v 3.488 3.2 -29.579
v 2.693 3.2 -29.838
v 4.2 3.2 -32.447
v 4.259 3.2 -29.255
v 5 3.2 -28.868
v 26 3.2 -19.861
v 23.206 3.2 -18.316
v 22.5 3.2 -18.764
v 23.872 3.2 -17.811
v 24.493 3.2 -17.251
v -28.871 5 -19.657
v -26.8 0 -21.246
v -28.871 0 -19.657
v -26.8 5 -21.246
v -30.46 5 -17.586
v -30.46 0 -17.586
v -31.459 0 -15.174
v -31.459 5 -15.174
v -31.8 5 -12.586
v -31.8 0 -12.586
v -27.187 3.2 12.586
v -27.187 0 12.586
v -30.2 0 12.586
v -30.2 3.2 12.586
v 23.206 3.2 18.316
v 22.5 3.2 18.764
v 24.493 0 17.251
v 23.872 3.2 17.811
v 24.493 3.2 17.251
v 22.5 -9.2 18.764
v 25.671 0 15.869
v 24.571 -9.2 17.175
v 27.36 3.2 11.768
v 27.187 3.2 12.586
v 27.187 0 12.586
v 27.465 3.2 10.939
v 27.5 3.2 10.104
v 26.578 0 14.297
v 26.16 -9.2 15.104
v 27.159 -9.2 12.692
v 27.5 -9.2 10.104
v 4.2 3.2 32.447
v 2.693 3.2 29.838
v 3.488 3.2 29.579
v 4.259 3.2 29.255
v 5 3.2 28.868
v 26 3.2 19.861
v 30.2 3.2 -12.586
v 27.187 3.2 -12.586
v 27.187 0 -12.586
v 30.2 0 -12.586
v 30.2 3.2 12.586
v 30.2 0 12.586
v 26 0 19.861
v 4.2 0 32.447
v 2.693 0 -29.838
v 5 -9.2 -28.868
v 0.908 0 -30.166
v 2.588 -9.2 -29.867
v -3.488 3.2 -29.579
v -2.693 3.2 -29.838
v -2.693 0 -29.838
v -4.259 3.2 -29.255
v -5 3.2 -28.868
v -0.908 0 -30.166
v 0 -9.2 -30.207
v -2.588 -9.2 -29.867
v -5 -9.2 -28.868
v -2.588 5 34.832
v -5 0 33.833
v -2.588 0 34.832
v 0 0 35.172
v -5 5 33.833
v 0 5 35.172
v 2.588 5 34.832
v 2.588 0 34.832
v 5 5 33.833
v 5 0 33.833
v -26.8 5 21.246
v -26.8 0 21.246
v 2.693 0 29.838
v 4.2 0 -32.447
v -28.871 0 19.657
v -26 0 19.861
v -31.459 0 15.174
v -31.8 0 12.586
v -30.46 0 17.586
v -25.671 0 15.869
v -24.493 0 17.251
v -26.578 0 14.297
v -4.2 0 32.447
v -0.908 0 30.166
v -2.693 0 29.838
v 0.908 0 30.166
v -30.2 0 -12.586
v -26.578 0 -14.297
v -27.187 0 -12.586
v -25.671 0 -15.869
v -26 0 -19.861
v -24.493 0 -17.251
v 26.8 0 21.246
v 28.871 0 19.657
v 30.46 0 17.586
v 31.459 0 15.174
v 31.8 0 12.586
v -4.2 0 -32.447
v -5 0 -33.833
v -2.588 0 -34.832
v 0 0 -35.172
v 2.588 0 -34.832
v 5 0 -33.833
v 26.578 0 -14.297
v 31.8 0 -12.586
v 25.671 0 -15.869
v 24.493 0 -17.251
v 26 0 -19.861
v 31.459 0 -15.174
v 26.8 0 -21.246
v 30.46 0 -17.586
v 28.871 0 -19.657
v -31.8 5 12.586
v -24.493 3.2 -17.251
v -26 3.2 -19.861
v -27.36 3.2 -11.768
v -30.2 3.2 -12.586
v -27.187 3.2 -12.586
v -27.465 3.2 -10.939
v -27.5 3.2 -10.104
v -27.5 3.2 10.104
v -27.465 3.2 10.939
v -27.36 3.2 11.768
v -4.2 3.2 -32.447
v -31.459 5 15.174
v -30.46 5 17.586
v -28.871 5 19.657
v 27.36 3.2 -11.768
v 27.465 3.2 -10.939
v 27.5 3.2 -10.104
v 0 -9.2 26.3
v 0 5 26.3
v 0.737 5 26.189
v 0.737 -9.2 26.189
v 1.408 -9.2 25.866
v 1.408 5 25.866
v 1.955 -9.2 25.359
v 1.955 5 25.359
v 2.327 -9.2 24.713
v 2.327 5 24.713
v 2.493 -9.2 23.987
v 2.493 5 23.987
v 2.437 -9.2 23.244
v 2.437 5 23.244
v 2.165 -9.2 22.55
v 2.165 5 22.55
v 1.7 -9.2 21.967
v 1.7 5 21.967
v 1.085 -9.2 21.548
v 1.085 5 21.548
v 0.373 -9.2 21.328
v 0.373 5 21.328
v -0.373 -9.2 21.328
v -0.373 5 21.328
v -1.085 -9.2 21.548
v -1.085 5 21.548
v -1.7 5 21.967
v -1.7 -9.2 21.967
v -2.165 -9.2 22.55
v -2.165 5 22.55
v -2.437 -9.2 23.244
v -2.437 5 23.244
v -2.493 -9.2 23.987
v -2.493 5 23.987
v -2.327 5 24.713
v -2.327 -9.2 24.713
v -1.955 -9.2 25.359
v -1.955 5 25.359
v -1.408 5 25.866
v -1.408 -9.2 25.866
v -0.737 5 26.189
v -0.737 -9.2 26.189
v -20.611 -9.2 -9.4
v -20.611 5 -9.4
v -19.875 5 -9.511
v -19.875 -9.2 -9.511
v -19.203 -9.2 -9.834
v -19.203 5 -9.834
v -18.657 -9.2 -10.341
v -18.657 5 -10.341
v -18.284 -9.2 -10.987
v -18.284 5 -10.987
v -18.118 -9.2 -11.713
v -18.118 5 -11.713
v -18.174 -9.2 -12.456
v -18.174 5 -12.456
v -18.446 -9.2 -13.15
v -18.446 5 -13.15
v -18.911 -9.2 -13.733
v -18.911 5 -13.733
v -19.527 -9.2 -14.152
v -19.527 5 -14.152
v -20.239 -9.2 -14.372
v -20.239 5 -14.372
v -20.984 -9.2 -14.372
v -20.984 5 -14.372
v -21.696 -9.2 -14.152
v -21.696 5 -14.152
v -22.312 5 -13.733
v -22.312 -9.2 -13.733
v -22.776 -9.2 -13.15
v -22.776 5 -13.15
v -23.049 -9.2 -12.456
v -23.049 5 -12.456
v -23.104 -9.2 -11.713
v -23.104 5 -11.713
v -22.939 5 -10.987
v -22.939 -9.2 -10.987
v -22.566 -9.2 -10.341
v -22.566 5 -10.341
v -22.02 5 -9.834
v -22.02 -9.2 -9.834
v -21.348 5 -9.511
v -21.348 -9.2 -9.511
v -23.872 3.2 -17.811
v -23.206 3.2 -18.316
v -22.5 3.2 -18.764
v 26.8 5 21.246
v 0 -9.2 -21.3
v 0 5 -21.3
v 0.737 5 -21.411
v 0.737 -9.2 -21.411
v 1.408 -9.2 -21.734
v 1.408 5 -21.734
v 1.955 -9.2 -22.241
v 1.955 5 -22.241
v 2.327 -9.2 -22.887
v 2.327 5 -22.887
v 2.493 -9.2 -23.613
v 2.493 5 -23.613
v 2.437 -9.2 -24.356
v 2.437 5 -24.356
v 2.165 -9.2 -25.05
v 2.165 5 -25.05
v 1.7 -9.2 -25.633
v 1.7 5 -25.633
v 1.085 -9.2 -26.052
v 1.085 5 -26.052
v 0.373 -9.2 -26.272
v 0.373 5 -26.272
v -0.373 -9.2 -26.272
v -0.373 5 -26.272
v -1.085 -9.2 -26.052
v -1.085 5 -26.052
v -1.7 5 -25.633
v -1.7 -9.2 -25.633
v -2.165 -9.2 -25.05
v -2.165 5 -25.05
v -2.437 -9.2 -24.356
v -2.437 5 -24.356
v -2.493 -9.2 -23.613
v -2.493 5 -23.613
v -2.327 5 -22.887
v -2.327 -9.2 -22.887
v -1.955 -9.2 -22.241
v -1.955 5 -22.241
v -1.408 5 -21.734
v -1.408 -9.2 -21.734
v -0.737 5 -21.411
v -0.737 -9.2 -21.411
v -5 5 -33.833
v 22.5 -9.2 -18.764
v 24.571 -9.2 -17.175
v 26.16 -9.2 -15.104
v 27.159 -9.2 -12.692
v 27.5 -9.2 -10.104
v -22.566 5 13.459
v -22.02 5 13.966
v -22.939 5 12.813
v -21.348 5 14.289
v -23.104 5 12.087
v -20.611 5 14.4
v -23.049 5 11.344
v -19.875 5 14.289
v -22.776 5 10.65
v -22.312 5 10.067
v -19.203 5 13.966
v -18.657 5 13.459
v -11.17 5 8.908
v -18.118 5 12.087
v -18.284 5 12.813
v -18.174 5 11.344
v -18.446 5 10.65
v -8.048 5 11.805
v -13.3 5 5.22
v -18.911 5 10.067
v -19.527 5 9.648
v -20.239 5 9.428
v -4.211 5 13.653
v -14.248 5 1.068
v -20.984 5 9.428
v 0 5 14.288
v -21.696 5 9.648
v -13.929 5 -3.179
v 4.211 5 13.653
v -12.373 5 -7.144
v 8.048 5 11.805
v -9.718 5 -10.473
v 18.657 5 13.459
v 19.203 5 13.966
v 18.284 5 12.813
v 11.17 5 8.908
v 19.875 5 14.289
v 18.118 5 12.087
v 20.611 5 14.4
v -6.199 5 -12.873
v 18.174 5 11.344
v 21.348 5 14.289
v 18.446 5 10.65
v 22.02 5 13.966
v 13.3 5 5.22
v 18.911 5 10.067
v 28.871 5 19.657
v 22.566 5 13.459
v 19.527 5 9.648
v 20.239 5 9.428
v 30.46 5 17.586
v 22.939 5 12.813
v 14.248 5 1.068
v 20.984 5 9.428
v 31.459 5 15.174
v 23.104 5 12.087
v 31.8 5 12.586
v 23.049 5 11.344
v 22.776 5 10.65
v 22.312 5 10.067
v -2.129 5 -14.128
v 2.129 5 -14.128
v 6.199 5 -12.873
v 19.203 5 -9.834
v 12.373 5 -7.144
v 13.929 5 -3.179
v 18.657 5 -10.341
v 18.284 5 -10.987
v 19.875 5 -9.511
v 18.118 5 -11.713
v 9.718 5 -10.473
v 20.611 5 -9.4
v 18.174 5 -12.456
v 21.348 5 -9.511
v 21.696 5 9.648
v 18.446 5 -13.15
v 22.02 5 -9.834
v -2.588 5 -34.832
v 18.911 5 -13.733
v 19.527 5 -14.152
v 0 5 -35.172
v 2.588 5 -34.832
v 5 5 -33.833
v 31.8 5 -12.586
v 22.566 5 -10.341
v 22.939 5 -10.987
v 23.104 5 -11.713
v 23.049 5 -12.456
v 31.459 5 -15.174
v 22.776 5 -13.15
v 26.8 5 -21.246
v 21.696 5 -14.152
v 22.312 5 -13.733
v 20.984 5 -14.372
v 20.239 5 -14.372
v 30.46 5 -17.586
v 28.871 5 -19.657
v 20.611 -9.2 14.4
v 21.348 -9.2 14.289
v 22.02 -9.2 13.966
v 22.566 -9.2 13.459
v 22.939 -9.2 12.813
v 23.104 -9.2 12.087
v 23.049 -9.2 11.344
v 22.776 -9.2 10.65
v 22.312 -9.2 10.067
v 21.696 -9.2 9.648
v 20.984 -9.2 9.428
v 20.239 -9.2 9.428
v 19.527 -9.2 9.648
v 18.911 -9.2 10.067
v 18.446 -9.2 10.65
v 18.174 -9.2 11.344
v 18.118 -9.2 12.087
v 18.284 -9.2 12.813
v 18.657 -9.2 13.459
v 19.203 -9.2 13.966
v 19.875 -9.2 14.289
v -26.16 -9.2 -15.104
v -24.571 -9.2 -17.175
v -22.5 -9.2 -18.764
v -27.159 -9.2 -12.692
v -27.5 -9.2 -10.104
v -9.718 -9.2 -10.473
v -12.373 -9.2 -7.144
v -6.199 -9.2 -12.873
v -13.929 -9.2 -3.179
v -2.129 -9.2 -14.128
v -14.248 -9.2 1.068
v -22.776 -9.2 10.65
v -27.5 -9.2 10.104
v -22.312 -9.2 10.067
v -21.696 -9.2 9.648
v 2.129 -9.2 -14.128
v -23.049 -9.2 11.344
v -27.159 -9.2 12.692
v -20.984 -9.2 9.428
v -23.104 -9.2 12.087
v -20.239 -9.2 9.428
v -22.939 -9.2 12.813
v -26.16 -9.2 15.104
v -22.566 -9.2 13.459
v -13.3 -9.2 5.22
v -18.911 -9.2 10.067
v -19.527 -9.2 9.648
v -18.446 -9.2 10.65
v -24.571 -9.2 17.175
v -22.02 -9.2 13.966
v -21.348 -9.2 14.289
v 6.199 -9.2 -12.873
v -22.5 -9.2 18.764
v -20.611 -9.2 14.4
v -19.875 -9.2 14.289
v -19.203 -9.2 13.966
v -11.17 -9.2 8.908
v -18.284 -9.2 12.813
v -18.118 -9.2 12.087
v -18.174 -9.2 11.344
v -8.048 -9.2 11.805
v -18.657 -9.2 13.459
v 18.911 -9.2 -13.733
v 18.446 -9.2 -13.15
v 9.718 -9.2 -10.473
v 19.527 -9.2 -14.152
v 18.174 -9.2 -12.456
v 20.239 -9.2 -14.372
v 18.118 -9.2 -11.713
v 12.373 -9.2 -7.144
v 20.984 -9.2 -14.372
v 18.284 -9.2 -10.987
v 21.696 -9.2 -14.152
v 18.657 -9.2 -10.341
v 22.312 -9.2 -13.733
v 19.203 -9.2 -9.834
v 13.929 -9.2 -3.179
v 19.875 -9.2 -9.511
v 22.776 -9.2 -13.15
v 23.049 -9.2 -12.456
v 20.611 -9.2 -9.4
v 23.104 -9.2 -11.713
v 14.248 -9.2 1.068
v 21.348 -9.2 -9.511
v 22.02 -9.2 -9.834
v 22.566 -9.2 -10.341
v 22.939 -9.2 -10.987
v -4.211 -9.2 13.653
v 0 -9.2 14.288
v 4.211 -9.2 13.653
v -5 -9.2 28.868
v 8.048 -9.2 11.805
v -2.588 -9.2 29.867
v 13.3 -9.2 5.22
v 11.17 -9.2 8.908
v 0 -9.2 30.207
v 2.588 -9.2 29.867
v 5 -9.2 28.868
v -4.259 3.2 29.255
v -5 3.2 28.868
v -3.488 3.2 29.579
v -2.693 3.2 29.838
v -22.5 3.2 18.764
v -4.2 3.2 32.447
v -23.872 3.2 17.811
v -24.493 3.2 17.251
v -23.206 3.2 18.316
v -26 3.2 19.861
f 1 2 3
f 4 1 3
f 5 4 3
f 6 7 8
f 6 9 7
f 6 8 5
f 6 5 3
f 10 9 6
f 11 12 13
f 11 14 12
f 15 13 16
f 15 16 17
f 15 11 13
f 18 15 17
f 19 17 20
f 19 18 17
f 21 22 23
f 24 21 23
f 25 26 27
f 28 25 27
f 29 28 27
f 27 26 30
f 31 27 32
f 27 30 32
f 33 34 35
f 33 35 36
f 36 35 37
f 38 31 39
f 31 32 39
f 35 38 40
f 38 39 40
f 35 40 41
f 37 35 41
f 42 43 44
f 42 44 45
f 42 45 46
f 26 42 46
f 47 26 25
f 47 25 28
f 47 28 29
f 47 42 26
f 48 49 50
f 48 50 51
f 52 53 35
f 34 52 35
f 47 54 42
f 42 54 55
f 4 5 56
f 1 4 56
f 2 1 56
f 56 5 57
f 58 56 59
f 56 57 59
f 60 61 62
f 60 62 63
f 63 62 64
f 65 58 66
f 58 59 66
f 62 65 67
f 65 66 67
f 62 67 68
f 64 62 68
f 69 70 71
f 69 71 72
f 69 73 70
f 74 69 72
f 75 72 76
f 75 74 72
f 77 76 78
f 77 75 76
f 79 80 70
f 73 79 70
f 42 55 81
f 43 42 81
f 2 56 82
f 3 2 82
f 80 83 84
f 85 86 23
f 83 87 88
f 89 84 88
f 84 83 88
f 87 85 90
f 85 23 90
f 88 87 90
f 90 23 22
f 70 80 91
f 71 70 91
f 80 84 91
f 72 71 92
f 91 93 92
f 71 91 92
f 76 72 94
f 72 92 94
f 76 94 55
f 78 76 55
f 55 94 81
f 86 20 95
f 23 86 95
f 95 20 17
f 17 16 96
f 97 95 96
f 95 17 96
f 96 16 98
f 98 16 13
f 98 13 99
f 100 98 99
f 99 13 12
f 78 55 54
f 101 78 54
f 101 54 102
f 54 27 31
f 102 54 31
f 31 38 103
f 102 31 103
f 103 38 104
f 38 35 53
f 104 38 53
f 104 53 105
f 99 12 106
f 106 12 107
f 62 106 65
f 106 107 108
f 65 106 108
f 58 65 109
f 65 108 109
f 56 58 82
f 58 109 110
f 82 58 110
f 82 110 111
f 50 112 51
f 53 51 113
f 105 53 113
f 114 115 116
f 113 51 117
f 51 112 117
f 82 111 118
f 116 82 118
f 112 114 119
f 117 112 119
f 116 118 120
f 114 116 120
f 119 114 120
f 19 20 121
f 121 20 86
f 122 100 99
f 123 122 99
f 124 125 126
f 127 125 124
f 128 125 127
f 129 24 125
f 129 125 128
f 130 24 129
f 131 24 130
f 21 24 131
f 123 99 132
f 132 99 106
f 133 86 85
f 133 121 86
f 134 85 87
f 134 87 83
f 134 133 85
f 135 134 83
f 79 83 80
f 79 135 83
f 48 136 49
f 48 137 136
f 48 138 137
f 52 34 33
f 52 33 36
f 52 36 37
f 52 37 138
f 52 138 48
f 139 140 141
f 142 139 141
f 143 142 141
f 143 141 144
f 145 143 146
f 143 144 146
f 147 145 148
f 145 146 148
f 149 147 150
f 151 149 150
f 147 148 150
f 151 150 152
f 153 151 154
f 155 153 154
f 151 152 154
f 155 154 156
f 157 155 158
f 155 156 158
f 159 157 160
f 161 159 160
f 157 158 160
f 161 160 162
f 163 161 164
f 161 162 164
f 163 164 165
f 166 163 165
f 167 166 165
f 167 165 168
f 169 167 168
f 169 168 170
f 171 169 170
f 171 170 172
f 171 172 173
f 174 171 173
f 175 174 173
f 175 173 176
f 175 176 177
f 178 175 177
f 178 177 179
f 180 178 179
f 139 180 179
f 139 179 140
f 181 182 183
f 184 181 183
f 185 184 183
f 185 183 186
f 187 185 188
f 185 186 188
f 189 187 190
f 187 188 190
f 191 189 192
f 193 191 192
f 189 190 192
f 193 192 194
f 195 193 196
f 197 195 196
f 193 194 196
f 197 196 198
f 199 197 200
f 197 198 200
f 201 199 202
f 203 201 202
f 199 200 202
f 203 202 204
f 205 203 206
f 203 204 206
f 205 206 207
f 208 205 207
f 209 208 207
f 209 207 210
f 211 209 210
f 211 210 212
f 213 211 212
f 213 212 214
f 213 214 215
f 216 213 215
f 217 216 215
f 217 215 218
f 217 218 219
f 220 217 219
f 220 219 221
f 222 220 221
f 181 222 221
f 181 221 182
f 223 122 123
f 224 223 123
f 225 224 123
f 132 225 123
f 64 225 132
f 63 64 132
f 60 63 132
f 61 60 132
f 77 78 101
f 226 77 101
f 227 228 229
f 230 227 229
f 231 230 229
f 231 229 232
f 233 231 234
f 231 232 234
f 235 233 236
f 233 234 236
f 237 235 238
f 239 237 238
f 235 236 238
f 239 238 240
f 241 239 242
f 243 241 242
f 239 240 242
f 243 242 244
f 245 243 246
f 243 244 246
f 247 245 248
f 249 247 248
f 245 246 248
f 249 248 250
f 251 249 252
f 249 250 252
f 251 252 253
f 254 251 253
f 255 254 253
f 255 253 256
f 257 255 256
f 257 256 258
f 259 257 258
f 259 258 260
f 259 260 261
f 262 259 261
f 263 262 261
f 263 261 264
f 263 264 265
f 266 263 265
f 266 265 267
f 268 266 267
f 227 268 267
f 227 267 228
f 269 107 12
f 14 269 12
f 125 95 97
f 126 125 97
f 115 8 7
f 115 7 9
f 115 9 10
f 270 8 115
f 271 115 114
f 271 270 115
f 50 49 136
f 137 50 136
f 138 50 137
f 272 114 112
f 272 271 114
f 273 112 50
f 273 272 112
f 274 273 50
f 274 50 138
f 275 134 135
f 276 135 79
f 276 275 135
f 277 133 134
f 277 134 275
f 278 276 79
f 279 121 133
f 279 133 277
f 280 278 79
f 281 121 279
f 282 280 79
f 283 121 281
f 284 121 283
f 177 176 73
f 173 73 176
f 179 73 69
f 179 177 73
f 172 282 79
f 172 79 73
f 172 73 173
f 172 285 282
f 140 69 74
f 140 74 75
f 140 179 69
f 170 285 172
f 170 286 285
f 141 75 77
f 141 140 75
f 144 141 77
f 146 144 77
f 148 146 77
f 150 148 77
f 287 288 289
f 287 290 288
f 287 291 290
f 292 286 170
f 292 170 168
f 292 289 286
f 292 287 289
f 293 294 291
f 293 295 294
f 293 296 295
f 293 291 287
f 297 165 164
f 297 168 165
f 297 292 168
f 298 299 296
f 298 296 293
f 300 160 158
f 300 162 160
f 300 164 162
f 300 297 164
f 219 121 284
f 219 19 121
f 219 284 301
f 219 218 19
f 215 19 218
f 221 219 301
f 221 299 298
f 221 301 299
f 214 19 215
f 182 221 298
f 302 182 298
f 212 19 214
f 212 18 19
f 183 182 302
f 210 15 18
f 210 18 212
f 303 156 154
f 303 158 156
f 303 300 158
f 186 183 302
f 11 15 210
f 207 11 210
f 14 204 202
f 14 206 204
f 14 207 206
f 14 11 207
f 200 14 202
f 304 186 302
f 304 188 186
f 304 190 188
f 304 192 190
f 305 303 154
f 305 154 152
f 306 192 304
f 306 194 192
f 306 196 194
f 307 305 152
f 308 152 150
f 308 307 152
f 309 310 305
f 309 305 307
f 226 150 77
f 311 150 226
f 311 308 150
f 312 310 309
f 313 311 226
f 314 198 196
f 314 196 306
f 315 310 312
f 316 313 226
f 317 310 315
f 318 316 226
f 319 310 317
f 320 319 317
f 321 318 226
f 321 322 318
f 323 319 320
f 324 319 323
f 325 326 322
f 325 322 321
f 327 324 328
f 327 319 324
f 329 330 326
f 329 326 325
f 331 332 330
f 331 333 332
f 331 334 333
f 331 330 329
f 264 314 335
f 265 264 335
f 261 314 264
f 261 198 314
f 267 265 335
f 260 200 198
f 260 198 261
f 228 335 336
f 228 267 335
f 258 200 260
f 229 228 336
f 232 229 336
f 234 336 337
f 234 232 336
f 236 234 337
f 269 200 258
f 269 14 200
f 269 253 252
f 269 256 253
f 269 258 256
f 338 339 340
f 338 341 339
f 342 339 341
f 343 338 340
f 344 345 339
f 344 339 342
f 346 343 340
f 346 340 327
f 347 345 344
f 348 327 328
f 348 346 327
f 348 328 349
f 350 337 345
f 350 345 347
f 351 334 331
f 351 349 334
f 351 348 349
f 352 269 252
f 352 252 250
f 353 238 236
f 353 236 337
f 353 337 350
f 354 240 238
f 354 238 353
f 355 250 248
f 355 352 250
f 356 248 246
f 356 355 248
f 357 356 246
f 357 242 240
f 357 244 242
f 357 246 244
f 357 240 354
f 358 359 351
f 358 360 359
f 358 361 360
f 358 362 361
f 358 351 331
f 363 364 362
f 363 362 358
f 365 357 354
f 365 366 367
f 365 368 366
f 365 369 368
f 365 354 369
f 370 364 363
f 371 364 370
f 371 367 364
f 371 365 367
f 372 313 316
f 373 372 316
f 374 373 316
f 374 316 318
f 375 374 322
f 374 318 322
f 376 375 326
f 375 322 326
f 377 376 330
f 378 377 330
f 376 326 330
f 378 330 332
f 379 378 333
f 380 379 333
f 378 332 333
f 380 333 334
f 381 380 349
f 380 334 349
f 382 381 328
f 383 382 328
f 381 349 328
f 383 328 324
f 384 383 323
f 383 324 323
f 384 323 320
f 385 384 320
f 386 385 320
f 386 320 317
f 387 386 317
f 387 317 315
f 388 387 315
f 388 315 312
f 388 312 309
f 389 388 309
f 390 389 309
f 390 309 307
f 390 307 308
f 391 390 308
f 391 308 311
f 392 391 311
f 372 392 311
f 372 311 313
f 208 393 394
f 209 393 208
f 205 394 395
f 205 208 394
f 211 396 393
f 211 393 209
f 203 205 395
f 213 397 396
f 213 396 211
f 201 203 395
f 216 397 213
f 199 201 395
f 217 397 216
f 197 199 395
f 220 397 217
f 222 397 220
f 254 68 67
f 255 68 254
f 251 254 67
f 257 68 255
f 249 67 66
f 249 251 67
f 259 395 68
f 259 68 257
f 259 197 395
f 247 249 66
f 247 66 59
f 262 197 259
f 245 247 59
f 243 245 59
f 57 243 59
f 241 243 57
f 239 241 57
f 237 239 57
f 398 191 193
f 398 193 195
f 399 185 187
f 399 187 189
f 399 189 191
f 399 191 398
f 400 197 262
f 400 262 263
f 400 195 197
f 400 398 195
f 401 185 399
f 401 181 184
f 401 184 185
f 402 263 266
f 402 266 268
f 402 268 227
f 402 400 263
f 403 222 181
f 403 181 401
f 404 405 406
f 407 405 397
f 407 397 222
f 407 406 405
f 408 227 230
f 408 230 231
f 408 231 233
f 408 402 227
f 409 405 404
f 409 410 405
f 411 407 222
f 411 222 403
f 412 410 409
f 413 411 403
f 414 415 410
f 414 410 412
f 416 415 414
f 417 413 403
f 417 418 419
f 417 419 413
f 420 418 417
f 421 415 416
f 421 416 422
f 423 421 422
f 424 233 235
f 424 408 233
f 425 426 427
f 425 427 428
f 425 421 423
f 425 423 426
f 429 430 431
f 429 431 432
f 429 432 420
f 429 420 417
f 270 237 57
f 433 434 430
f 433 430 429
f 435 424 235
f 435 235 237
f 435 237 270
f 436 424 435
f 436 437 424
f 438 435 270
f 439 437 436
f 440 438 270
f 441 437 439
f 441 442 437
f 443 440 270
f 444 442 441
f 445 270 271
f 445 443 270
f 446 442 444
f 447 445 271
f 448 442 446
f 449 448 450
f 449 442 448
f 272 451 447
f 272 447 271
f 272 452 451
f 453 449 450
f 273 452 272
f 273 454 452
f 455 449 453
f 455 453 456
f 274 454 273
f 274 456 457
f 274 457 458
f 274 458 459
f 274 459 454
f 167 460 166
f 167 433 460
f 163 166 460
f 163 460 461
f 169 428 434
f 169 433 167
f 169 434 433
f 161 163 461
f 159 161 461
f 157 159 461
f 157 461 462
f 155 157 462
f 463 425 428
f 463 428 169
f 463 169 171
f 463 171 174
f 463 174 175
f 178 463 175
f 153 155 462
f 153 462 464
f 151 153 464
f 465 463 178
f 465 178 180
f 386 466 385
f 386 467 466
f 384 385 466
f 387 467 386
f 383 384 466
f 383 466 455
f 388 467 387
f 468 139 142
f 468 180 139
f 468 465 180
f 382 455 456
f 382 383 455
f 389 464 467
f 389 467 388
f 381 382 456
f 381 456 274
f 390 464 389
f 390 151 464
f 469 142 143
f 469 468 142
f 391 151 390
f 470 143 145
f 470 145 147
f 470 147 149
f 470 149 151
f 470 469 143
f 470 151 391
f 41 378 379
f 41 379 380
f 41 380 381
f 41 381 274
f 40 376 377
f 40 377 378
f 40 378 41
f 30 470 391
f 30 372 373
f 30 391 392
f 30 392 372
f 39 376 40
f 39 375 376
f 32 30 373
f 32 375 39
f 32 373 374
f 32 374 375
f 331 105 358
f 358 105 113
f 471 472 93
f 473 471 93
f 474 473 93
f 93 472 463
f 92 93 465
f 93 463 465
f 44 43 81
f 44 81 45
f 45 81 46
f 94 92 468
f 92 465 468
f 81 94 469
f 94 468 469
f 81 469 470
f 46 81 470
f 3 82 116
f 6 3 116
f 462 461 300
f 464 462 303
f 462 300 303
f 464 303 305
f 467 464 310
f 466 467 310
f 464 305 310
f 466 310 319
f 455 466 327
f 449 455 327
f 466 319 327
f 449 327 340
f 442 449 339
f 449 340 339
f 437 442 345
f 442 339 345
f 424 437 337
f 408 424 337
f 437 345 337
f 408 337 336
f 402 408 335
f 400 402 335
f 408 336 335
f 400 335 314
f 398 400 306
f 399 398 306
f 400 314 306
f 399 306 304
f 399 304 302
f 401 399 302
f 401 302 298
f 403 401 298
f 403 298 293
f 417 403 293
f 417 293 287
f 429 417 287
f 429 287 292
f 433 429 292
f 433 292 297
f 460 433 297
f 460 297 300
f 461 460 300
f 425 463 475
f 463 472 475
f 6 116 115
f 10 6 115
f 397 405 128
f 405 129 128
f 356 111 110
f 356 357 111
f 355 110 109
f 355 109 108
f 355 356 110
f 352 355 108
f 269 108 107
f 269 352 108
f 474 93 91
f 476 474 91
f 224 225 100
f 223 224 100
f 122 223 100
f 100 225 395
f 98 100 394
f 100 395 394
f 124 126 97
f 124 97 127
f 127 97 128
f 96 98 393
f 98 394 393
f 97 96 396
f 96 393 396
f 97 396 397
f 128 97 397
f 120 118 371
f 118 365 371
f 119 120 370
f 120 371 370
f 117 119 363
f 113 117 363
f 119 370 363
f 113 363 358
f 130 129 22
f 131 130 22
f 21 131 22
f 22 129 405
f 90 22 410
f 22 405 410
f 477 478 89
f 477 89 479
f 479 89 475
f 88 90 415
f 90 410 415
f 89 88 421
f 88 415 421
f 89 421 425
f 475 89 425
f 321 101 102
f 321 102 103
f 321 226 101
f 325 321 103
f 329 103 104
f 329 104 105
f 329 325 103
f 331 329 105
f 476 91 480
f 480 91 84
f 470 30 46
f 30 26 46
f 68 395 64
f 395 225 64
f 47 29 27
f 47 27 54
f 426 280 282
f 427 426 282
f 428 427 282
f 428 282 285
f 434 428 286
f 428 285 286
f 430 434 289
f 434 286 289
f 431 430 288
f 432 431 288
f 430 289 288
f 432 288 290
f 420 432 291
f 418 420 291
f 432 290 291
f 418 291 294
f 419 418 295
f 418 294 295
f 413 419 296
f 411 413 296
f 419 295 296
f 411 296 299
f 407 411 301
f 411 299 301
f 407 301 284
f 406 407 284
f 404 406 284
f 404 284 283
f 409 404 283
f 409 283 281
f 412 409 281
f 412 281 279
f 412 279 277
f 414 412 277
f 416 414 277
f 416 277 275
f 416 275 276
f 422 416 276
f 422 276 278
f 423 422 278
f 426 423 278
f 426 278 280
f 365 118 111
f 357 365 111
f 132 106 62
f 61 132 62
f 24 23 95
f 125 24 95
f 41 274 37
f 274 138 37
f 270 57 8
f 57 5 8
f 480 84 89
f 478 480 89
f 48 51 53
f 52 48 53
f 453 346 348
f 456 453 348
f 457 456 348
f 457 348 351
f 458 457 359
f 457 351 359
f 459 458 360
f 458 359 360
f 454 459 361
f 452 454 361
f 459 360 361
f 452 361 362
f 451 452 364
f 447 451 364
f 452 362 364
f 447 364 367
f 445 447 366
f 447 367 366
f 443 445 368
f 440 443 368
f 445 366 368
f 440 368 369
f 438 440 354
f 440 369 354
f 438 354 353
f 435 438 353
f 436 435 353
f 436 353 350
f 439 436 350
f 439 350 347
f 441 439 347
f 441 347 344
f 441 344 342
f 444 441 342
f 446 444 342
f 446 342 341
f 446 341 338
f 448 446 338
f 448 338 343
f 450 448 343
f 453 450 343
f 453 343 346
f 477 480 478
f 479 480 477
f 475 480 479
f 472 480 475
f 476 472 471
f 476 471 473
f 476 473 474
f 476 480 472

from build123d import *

# Parameters (mm, degrees)
BOSS_EXTRUDE1_DEPTH = 5
FILLET1_R           = 10
BOSS_EXTRUDE2_DEPTH = 9.2
CUT_EXTRUDE1_DEPTH  = 3.2
SKETCH2_R           = 2.4999999999999996
SKETCH2_R_2         = 2.500000000000053
SKETCH2_R_3         = 2.5000000000000964
SKETCH2_R_4         = 2.5000000000000018
SKETCH2_R_5         = 2.4999999999999947
SKETCH2_R_6         = 14.287500000000001
CUT_EXTRUDE2_DEPTH  = 50.49730061393943
FILLET2_R           = 10


with BuildPart() as part:
    # Sketch1 → Boss-Extrude1 (new body)
    with BuildSketch(Plane(origin=(0, 0, 0), x_dir=(1, 0, 0), z_dir=(0, 1, 0))):
        Polygon((31.8, 18.359738560230117), (-9.39e-15, 36.719477120460205), (-31.799999999999994, 18.359738560230117), (-31.799999999999986, -18.359738560230095), (2.025e-14, -36.719477120460205), (31.800000000000008, -18.35973856023011), align=None)
    extrude(amount=BOSS_EXTRUDE1_DEPTH)

    # Fillet1
    fillet1_edges = [part.edges().sort_by_distance(p)[0] for p in [
        (31.800000000000008, 2.5, 18.35973856023011),
        (2.025e-14, 2.5, 36.719477120460205),
        (-31.799999999999986, 2.5, 18.359738560230095),
        (-31.799999999999994, 2.5, -18.359738560230117),
        (-9.39e-15, 2.5, -36.719477120460205),
        (31.8, 2.5, -18.359738560230117),
    ]]
    fillet(fillet1_edges, radius=FILLET1_R)

    # Sketch3 → Boss-Extrude2 (add)
    with BuildSketch(Plane.XZ):
        Polygon((27.499999999999996, 15.877132402714718), (9.57e-15, 31.754264805429415), (-27.500000000000004, 15.877132402714711), (-27.499999999999996, -15.877132402714711), (1.826e-14, -31.754264805429422), (27.50000000000001, -15.877132402714718), align=None)
    extrude(amount=BOSS_EXTRUDE2_DEPTH)

    # Sketch4 → Cut-Extrude1 (cut)
    with BuildSketch(Plane.XZ):
        Polygon((2.8499999999999854, -30.108816538239008), (4.199999999999984, -32.44708512845699), (26.000000000000007, -19.86084926012314), (24.650000000000006, -17.522580669905157), align=None)
        Polygon((-25.999999999999996, -19.860849260123146), (-4.200000000000003, -32.447085128456976), (-2.8499999999999983, -30.108816538238976), (-24.649999999999988, -17.52258066990515), align=None)
        Polygon((27.499999999999996, -12.586235868333851), (30.200000000000003, -12.586235868333851), (30.200000000000006, 12.586235868333848), (27.499999999999996, 12.586235868333848), align=None)
        Polygon((24.650000000000006, 17.522580669905146), (26.00000000000001, 19.860849260123135), (4.200000000000031, 32.44708512845697), (2.8500000000000263, 30.108816538238973), align=None)
        Polygon((-30.19999999999999, 12.58623586833384), (-30.199999999999996, -12.586235868333855), (-27.5, -12.58623586833386), (-27.500000000000004, 12.58623586833384), align=None)
        Polygon((-4.199999999999982, 32.44708512845697), (-25.99999999999999, 19.860849260123125), (-24.64999999999999, 17.52258066990515), (-2.849999999999986, 30.108816538238987), align=None)
    extrude(amount=-CUT_EXTRUDE1_DEPTH, mode=Mode.SUBTRACT)

    # Sketch2 → Cut-Extrude2 (cut, through all)
    with BuildSketch(Plane(origin=(0, 5, 0), x_dir=(1, 0, 0), z_dir=(0, 1, 0))):
        with Locations(Location((1.561e-14, 23.799999999999994, 0), (0, 0, 270))):
            Circle(SKETCH2_R)
        with Locations(Location((20.61140461006965, 11.899999999999997, 0), (0, 0, 270))):
            Circle(SKETCH2_R_2)
        with Locations(Location((20.61140461006965, -11.899999999999993, 0), (0, 0, 270))):
            Circle(SKETCH2_R_3)
        with Locations(Location((-1.561e-14, -23.800000000000015, 0), (0, 0, 270))):
            Circle(SKETCH2_R_4)
        with Locations(Location((-20.61140461006965, -11.899999999999993, 0), (0, 0, 270))):
            Circle(SKETCH2_R_5)
        with Locations(Location((-20.611404610069634, 11.899999999999999, 0), (0, 0, 270))):
            Circle(SKETCH2_R_5)
        with Locations(Location((0, 0, 0), (0, 0, 270))):
            Circle(SKETCH2_R_6)
    extrude(amount=-CUT_EXTRUDE2_DEPTH, mode=Mode.SUBTRACT)

    # Fillet2
    fillet2_edges = [part.edges().sort_by_distance(p)[0] for p in [
        (27.499999999999996, -4.6, 15.877132402714718),
        (9.57e-15, -4.6, 31.754264805429415),
        (-27.500000000000004, -4.6, 15.877132402714711),
        (-27.499999999999996, -4.6, -15.877132402714711),
        (27.50000000000001, -4.6, -15.877132402714718),
        (1.826e-14, -4.6, -31.754264805429422),
    ]]
    fillet(fillet2_edges, radius=FILLET2_R)


solid = part.part
